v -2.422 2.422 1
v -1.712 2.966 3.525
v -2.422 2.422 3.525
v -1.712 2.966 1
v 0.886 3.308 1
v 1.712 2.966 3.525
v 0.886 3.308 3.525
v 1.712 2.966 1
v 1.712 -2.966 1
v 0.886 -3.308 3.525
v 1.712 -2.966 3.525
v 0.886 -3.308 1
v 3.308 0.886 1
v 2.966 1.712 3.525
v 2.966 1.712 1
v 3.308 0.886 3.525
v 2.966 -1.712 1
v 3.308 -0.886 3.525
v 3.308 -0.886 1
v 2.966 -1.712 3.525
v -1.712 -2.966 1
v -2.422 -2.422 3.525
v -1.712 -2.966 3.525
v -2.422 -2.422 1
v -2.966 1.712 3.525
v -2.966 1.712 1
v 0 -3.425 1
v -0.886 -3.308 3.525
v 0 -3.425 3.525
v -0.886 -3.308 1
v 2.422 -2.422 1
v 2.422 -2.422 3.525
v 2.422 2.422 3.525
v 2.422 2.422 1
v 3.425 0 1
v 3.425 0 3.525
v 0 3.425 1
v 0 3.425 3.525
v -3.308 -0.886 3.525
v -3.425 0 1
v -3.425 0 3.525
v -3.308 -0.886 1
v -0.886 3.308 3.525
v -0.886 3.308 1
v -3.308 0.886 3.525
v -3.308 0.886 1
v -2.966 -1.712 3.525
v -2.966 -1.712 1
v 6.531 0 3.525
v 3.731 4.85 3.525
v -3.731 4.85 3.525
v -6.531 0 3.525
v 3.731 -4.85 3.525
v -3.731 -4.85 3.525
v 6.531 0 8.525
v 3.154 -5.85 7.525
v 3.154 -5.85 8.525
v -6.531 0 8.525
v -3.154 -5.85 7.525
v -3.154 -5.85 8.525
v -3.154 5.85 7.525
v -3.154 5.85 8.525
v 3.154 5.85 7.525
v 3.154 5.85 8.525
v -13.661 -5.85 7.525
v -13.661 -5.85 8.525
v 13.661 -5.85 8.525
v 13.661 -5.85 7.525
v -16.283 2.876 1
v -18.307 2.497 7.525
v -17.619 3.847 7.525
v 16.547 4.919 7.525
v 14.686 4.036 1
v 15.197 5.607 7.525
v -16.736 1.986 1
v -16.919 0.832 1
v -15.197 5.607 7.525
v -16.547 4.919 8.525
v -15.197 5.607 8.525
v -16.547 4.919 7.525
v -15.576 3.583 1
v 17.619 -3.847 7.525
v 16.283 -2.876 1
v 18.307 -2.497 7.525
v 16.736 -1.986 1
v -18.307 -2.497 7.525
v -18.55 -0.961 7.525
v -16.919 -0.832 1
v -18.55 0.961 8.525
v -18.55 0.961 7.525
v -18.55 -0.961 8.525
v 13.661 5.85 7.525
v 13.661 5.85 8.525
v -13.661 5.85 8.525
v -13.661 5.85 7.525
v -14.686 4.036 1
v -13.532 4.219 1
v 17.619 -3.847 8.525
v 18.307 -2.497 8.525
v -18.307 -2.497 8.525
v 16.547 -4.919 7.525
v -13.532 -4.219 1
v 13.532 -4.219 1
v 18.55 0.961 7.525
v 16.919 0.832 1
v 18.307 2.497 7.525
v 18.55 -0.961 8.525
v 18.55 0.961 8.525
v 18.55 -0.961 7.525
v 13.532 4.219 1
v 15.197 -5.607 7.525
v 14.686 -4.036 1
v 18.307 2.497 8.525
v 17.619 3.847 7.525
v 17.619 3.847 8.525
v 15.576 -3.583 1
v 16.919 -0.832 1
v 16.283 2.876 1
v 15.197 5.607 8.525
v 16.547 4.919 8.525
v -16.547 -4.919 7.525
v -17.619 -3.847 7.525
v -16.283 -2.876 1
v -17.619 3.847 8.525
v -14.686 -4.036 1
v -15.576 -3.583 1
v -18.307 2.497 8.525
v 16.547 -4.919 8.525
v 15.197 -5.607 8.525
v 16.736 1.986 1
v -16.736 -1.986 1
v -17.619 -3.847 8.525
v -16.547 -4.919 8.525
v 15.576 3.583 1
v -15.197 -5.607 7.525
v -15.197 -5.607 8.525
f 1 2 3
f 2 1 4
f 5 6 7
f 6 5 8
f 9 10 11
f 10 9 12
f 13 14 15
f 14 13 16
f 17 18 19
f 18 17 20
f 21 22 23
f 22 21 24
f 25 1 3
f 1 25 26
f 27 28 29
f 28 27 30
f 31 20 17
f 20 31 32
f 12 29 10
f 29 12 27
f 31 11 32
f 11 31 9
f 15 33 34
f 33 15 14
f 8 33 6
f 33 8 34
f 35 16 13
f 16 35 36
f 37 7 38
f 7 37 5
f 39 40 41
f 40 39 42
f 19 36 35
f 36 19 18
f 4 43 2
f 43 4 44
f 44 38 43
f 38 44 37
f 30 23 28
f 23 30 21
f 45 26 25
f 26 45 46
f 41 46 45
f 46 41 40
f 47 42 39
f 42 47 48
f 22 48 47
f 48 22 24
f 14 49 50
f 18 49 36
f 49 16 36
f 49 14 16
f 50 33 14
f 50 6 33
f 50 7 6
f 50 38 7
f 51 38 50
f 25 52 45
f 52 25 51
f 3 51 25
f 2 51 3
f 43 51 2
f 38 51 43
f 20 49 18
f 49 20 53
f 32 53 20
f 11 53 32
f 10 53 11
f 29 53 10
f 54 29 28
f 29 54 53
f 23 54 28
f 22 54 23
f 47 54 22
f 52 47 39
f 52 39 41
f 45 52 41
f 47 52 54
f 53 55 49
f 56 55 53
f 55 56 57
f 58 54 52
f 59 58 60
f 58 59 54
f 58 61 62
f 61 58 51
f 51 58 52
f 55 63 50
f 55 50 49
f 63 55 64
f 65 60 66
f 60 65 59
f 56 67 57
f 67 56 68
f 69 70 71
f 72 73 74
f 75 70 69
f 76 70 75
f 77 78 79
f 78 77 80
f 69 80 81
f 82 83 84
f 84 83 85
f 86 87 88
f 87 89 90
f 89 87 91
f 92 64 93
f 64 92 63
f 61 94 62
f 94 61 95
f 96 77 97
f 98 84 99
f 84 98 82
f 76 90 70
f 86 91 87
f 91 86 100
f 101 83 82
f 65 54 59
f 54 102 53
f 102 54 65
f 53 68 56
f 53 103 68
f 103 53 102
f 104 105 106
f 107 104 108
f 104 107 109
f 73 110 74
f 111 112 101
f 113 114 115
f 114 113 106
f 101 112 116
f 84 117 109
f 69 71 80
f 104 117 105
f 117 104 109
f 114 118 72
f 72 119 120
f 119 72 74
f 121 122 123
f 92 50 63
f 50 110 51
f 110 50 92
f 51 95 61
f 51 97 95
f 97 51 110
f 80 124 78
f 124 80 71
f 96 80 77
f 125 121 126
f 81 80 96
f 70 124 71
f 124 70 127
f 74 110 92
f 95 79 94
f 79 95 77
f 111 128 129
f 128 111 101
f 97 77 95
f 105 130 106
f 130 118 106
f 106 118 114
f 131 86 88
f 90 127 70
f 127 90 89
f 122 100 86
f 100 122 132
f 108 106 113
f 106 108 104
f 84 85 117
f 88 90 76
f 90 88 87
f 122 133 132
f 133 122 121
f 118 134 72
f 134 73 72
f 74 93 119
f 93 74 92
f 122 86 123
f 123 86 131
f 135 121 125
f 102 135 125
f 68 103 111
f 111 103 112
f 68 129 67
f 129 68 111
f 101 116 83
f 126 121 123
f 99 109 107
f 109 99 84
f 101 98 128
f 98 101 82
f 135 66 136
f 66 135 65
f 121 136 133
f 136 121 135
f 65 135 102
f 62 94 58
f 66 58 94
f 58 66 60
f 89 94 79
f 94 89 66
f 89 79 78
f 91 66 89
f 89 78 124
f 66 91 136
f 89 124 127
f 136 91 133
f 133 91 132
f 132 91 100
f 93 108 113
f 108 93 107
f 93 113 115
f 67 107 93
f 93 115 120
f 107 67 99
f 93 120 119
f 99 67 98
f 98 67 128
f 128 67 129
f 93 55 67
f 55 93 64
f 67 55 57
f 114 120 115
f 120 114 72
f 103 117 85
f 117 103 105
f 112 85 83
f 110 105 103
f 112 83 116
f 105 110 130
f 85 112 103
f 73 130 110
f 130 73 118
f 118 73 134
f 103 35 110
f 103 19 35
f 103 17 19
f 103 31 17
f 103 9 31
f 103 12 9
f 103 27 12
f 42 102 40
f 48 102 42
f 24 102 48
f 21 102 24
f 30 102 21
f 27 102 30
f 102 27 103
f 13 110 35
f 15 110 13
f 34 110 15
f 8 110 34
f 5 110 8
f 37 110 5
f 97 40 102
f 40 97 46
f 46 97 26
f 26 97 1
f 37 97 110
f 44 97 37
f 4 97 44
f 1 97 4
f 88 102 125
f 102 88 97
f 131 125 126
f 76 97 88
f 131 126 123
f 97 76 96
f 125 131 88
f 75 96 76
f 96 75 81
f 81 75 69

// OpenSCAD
// file: ../lib/TOGMod1Constructors.scad
// TOGMod1Constructors-v1.11
// 
// Functions to construct objects understood by TOGMod1
// 
// v1.1:
// - Add togmod1_make_rounded_rect
// v1.2:
// - togmod1_make_rounded_rect can make ovals
// v1.3:
// - togmod1_circle_points, to just get the points of a circle
// - if pos parameter to circle function has a third element,
//   returned vertexes will include it as the z component;
// v1.3.1
// - Some assertions
// v1.4:
// - Refactor togmod1_rounded_rect_points and togmod1_circle_points
//   to use togmod1__make_nd_vector_adder for adapting to whatever
//   `pos` parameter is.
// v1.5:
// - togmod_rounded_rect_points will not simplify completely rounded sides
//   (where length of side is exactly twice the rounding radius)
//   unless simplify_rounded_sides=true
//   - This makes it more useful for polyhedron generation,
//     where radius varies, but number of points must remain constant.
// v1.6:
// - togmod1_make_rect makes a simple rectangle
// - togmod1_make_rounded_rect will defer to togmod1_make_rect when r=0
// v1.7:
// - togmod1_make_circle will return empty shape (["union"]) when d=0
// v1.8:
// - Add togmod1_text
// v1.9:
// - togmod1_circle_points uses 3 as minimum circle point count instead of 6
// v1.10:
// - Fix togmod1_linear_extrude_y so that range corresponds to Y start/end and
//   polygon X,Y correspond to X,Z.  Previously it was rotated wrongly,
//   which would have gone unnoticed for symmetrical shapes centered at 0,0.
// v1.11:
// - Remove an 'echo'

use <./TOGArrayLib1.scad>

function togmod1__make_nd_vector_adder(origin=[0,0]) =
	let(origin_is_zero = tal1_reduce(true, origin, function(prev,item) prev && item == 0))
	origin_is_zero ? (function(vec) len(vec) >= len(origin) ? vec : tal1_replace_at(origin, 0, vec)) :
	function(vec) [
		for(i=[0:1:max(len(origin),len(vec))-1]) (len(vec) > i ? vec[i] : 0) + (len(origin) > i ? origin[i] : 0),
	];

assert([1,2,3] == togmod1__make_nd_vector_adder()([1,2,3]));
assert([1,2,3] == togmod1__make_nd_vector_adder([0,0,3])([1,2]));


function togmod1_make_cuboid(size) =
	assert(is_list(size))
	assert(len(size) >= 3)
	assert(is_num(size[0]))
	assert(is_num(size[1]))
	assert(is_num(size[2]))
	["polyhedron-vf", [
		[-size[0]/2, -size[1]/2, -size[2]/2],
		[+size[0]/2, -size[1]/2, -size[2]/2],
		[-size[0]/2, +size[1]/2, -size[2]/2],
		[+size[0]/2, +size[1]/2, -size[2]/2],
		[-size[0]/2, -size[1]/2, +size[2]/2],
		[+size[0]/2, -size[1]/2, +size[2]/2],
		[-size[0]/2, +size[1]/2, +size[2]/2],
		[+size[0]/2, +size[1]/2, +size[2]/2]
	], [
		[0,1,3,2],[0,4,5,1],[4,6,7,5],[3,7,6,2],[1,5,7,3],[6,4,0,2]
	]];

function togmod1_make_polygon(verts) =
	["polygon-vp", verts, [[for( i=[0:1:len(verts)-1] ) i%len(verts)]]];

function togmod1_rounded_rect_points(size, r, pos=[0,0], simplify_rounded_sides=false) =
	assert(is_list(size))
	assert(len(size) >= 2)
	let(radii = is_list(r) ? r : is_num(r) ? [r,r] : assert(false, "rounded_rect r(adius) should be list<num> or num"))
	let(rx = radii[0])
	let(ry = radii[1])
	assert(is_num(rx))
	assert(is_num(ry))
	assert(size[0] >= 2*rx, str("size[0] must be >= 2*r[0]; size[0] = ",size[0],", 2*r[0] = ",2*rx))
	assert(size[1] >= 2*ry, str("size[1] must be >= 2*r[1]; size[1] = ",size[1],", 2*r[1] = ",2*ry))
	let(quarterfn=max($fn/4, 1))
	let(qfnx = simplify_rounded_sides && size[0] == 2*rx ? quarterfn-1 : quarterfn)
	let(qfny = simplify_rounded_sides && size[1] == 2*ry ? quarterfn-1 : quarterfn)
	let(finalizepos = togmod1__make_nd_vector_adder(pos))
[
	for(a=[0 : 1 : qfnx]) let(ang=      a*90/quarterfn) finalizepos([ size[0]/2-rx + rx*cos(ang),  size[1]/2-ry + ry*sin(ang)]),
	for(a=[0 : 1 : qfny]) let(ang= 90 + a*90/quarterfn) finalizepos([-size[0]/2+rx + rx*cos(ang),  size[1]/2-ry + ry*sin(ang)]),
	for(a=[0 : 1 : qfnx]) let(ang=180 + a*90/quarterfn) finalizepos([-size[0]/2+rx + rx*cos(ang), -size[1]/2+ry + ry*sin(ang)]),
	for(a=[0 : 1 : qfny]) let(ang=270 + a*90/quarterfn) finalizepos([ size[0]/2-rx + rx*cos(ang), -size[1]/2+ry + ry*sin(ang)]),
];

function togmod1_make_rect(size) =
	togmod1_make_polygon([
		[-size[0]/2, -size[1]/2],
		[+size[0]/2, -size[1]/2],
		[+size[0]/2, +size[1]/2],
		[-size[0]/2, +size[1]/2],
	]);

function togmod1_make_rounded_rect(size, r) =
	r == 0 ? togmod1_make_rect(size) :
	togmod1_make_polygon(togmod1_rounded_rect_points(size,r,simplify_rounded_sides=true));

/**
 * Returns points for an approximation of a circle where points are at distance r from pos.
 * Can be used to make other regular polygons, but the faces will be less than that
 * distance from pos (do some trig if you want face distance, e.g. for a hex nut).
 */
function togmod1_circle_points(r, pos=[0,0], d=undef) =
	assert( !is_undef(r) || !is_undef(d) )
	assert(!is_undef(pos[0]))
	assert(!is_undef(pos[1]))
	let(finalizepos = togmod1__make_nd_vector_adder(pos))
	let(r_ = !is_undef(r) ? r : d/2)
	let(fn = max($fn, 3))
	[for(i=[0 : 1 : fn-1]) finalizepos([r_*cos(i*360/fn), r_*sin(i*360/fn)])];

function togmod1_make_circle(r, pos=[0,0], d=undef) =
	r == 0 || d == 0 ? ["union"] :
	togmod1_make_polygon(togmod1_circle_points(r=r, pos=pos, d=d));

function togmod1_make_cylinder(d, zrange=[0,1], r=undef, pos=[0,0]) =
	assert( !is_undef(r) || !is_undef(d) )
	let( r_ = !is_undef(r) ? r : d/2 )
	// TODO: Make polyhedron directly
	["linear-extrude-zs", zrange, togmod1_make_circle(r=r_, pos=pos)];

function togmod1__is_range1d(range) = is_list(range) && len(range) == 2 && is_num(range[0]) && is_num(range[1]);

function togmod1_linear_extrude_z(range, shape) =
	assert(togmod1__is_range1d(range))
	["linear-extrude-zs", range, shape];
function togmod1_linear_extrude_x(range, shape) =
	assert(togmod1__is_range1d(range))
	["rotate", [90, 0, 90], togmod1_linear_extrude_z(range, shape)];
function togmod1_linear_extrude_y(range, shape) =
	assert(togmod1__is_range1d(range))
	["rotate", [90, 0,  0], togmod1_linear_extrude_z([-range[1], -range[0]], shape)];

function togmod1_text(text, size, font, halign, valign, spacing, direction, language, script) =
	["text-tsfhvsdls", text, size, font, halign, valign, spacing, direction, language, script];
// file: ../lib/TOGArrayLib1.scad
// TOGArrayLib1.5
// 
// Functions for working with arrays.
// 
// v1.1:
// - tal1_reduce assert(is_list(items)) to prevent infinite recursion
//   when given undefined or other non-list values
// v1.1.1:
// - Fix tal1_uniq_remap_v2 to return "list-remap-result" as the
//   first element of the returned list
// v1.2:
// - Add tal1_replace_at function
// v1.3:
// - tal1_is_vec_of, tal1_is_vec_of_num
// v1.4:
// - tal1_assert_for_each, for when you want to assert something
//   about each of a list of items and get nice failure messages
// v1.5:
// - Add tal1_duplicate_reversed function, which may be
//   handy when generating symmetrical polygons and stuff.

/**
 * Make a list with the contents of list `a`,
 * but starting at offset `off`, replaced by the contents of list `b`.
 * len(result) = max(len(a), off+len(b))
 */
function tal1_replace_at(a, off, b, default_value=undef, default_value_function=undef) =
	assert(is_list(a))
	assert(is_list(b))
	let( _dvf = !is_undef(default_value_function) ? default_value_function : function(i) default_value )
[
	for( i=[0:1:min(off,len(a))-1] ) a[i],
	for( i=[len(a):1:off-1] ) _dvf(i),
	for( i=[off:1:off+len(b)-1] ) b[i-off],
	for( i=[off+len(b):1:len(a)-1] ) a[i],
];

// Simplest case
assert([] == tal1_replace_at([], 0, []));
// Second simplest cases
assert(["foo"] == tal1_replace_at(["foo"], 0, []));
assert(["foo"] == tal1_replace_at([], 0, ["foo"]));
// Replace one item
assert(["foo","quux","baz"] == tal1_replace_at(["foo","bar","baz"], 1, ["quux"]));
// Replace and extend
assert(["foo","quux","tuna","tina"] == tal1_replace_at(["foo","bar","baz"], 1, ["quux", "tuna", "tina"]));
// Add beyond end of `a`
assert(["foo","zzz","quux"] == tal1_replace_at(["foo"], 2, ["quux"], default_value="zzz"));
// Adding 'nothing' should still fill to that point with defaults
assert(["foo","zzz","zzz"] == tal1_replace_at(["foo"], 3, [], default_value="zzz"));


function tal1_reduce(start, items, func, offset=0) =
	assert(is_list(items))
	len(items) == offset ? start :
	tal1_reduce(func(start, items[offset]), items, func, offset+1);

function tal1_consecutive_duplicate_count(items) = tal1_reduce(
	[0, undef],
	items,
	function(z,item) [z[0] + (item == z[1] ? 1 : 0), item]
)[0];

assert(0 == tal1_consecutive_duplicate_count([]));
assert(0 == tal1_consecutive_duplicate_count([50]));
assert(1 == tal1_consecutive_duplicate_count([50,50]));
assert(0 == tal1_consecutive_duplicate_count([50,51,52,53]));
assert(1 == tal1_consecutive_duplicate_count([50,51,52,52]));
assert(3 == tal1_consecutive_duplicate_count([50,50,50,50]));

// Set test_size to arbirarily large values
// to ensure that OpenSCAD can handle heavy recursion
let(test_size=1000) assert(test_size/2 == tal1_consecutive_duplicate_count([for(i=[0:1:test_size-1]) floor(i/2)]));



function tal1_uniq_(items, off0, off1) =
	let(chunklen = off1-off0)
	chunklen == 0 ? [] :
	chunklen == 1 ? [items[off0]] :
	let(half=floor(chunklen/2))
	let(left  = tal1_uniq_(items, off0     , off0+half))
	let(right = tal1_uniq_(items, off0+half, off1     ))
	assert(len(left) > 0)
	assert(len(right) > 0)
	left[len(left)-1] == right[0] ? [each left, for(i=[1:1:len(right)-1]) right[i]] :
	[each left, each right];

/** Given a list of items, returns a new list with identical consecutive items merged */
function tal1_uniq(items) = tal1_uniq_(items, 0, len(items));

assert([] == tal1_uniq([]));
assert([123] == tal1_uniq([123]));
assert([55,0,1,2,3] == tal1_uniq([55,0,1,2,3]));
assert([55,0,1,2] == tal1_uniq([55,0,1,1,2]));
assert([55,0,1] == tal1_uniq([55,55,0,0,0,0,0,0,1,1,1,1]));
assert([55,0] == tal1_uniq([55,0,0,0,0,0,0,0]));



/**
 * Returns [new items, old index -> new index mapping].
 * No-op version.
 */
function tal1_uniq_remap_v1(items) =
	["list-remap-result", items, [for (vi=[0:1:len(items)-1]) vi]];

// [a, a, b, b, c, c]
//
// [a,    ...], []  -> [a],[0]
// [a, a, ...], [0] -> [a],[0,0]

assert([1,2,3] == [1,2,3]);

/**
 * Recursive version that will combine adjacent identical vertexes,
 * but will use the original items.
 */
function tal1_uniq_remap_v2(items, map=[]) =
	let(index = len(map))
	len(items) == index ? ["list-remap-result", items, map] :
	index == 0 ? tal1_uniq_remap_v2(items, [0]) :
	items[index] == items[map[index-1]] ? tal1_uniq_remap_v2(items, [for(vi=map) vi, map[index-1]]) :
	tal1_uniq_remap_v2(items, [for(vi=map) vi, index]);

assert(tal1_uniq_remap_v2([1,1,2,2,3,4]) == ["list-remap-result", [1,1,2,2,3,4], [0,0,2,2,4,5]]);


/**
 * Returns true if `vec` is a list of at least min_len items
 * and component_check(each item, even those beyond min_len) is true.
 */
function tal1_is_vec_of(vec, min_len=0, component_check=function(x) true) =
	assert(is_num(min_len) && min_len >= 0)
	assert(is_function(component_check))
	is_list(vec) && len(vec) >= min_len &&
	tal1_reduce(true, vec, function(prev,item) prev && component_check(item));

function tal1_is_vec_of_num(vec, min_len=0) = tal1_is_vec_of(vec, min_len, function(i) is_num(i));

assert( true == tal1_is_vec_of_num([1,2,3]));
assert( true == tal1_is_vec_of_num([]));
assert( true == tal1_is_vec_of_num([1,2,3], 3));
assert(false == tal1_is_vec_of_num([1,2], 3));
assert(false == tal1_is_vec_of_num([1,2,"spoon"], 3));
// Requirements are ambiguous when
// first min_len items are numbers, but there are non-numeric items afterwards,
// so let's error on the side of saying 'no, it's not a list of numbers';
// i.e. the item check and the min_len are independent.
assert(false == tal1_is_vec_of_num([1,2,3,"artichoke"], 3));


/**
 * Asserts that item_checker(each item in list, index of item)[0] is true.
 * Second element of item_checker return value is assertion message.
 * Returns the original list, in case that's useful to you.
 */
function tal1_assert_for_each(list, item_checker) =
	let( _ignored = [ for(i=[0:1:len(list)-1])
		let(q=item_checker(list[i],i))
		let(passed=is_bool(q) ? q : is_list(q) ? q[0] : assert(false, str(
			"tal1_assert_for_each: item_checker should return Bool|[Bool,String], but returned ",
			q, " for item at index ", i)))
		let(message=is_list(q) ? q[1] : undef)
		assert(passed, message)
		q
	])
	list;

// Callback can return a boolean...
assert([1,2,3] == tal1_assert_for_each([1,2,3], function(v,i) is_num(v)));
// ...or a [boolean, string]
assert([1,2,3] == tal1_assert_for_each([1,2,3], function(v,i) [is_num(v), "element be a num"]));

// [a, b, c] -> [a, b, c, rxf(c), rxf(b), rxf(a)]
function tal1_duplicate_reversed(list, rxf=function(item) item) =
	[
		each list,
		for( i=[len(list)-1 : -1 : 0] ) rxf(list[i]),
	];
// file: ../lib/TOGComplexLib1.scad
function tcplx1_multiply(a, b) =
	[a[0]*b[0] - a[1]*b[1], a[0]*b[1] + a[1]*b[0]];
function tcplx1_divide(a, b) =
	let(bot = (b[0]*b[0] + b[1]*b[1]))
	[
		(a[0]*b[0] + a[1]*b[1])/bot,
		(a[1]*b[0] - a[0]*b[1])/bot
	];

assert([-11,23] == tcplx1_multiply([3,2], [1,7]));

assert([-1,3] == tcplx1_multiply([3,1], [0,1]));
assert([-1,3] == tcplx1_multiply([0,1], [3,1]));

echo(tcplx1_divide([-1,3], [3,1]));
assert([0,1] == tcplx1_divide([-1,3], [3,1]));

function tcplx1_normalize(vec) =
	let(veclen = sqrt(vec[0]*vec[0]+vec[1]*vec[1]))
	[vec[0] / veclen, vec[1] / veclen];

function tcplx1_relative_turnvec_vv(v0, v1) =
	tcplx1_divide(tcplx1_normalize(v1), tcplx1_normalize(v0));

function tcplx1_relative_turnvec_abc(p0, p1, p2) = tcplx1_relative_turnvec_vv(p1-p0, p2-p1);

// A 90-degree turn
assert([0,1] == tcplx1_relative_turnvec_abc([0,0], [1,0], [1,1]));
assert([0,1] == tcplx1_relative_turnvec_abc([0,0], [0,1], [-1,1]));

// A 45-degree turn
assert(tcplx1_normalize([1,1]) == tcplx1_relative_turnvec_abc([0,0], [1,0], [ 2,1]));
assert(tcplx1_normalize([1,1]) == tcplx1_relative_turnvec_abc([0,0], [0,1], [-1,2]));


function tcplx1_relative_angle_abc(p0, p1, p2) =
	let(turnvec = tcplx1_relative_turnvec_abc(p0, p1, p2))
	atan2(turnvec[1], turnvec[0]);

assert(-135 == tcplx1_relative_angle_abc([0,0], [1,0], [0,-1]));
assert( -90 == tcplx1_relative_angle_abc([0,0], [1,0], [1,-1]));
assert(   0 == tcplx1_relative_angle_abc([0,0], [1,0], [2, 0]));
assert(  90 == tcplx1_relative_angle_abc([0,0], [1,0], [1, 1]));
assert( 135 == tcplx1_relative_angle_abc([0,0], [1,0], [0, 1]));

assert(  90 == tcplx1_relative_angle_abc([1,1], [3,3], [1, 5]));
// file: ../lib/TOGMod1.scad
// TOGMod1.9
// OpenSCAD library for representing shapes
// 
// See also: Functional OpenSCAD (https://github.com/thehans/FunctionalOpenSCAD)
// 
// v1.8:
// - Add `text-tsfhvsdls`
// v1.9
// - Add `offset-ds` (offset with _d_elta a _s_hape)

module togmod1_domodule(mod) {
	assert(is_list(mod));
	assert(len(mod) > 0);
	if( mod[0] == "polygon-vp" ) {
		// ["polygon-vp", vertexes, paths]
		polygon(points=mod[1], paths=mod[2]);
	} else if( mod[0] == "polyhedron-vf" ) {
		polyhedron(mod[1], faces=mod[2]);
	} else if( mod[0] == "scale" ) {
		assert(len(mod) == 3);
		scale(mod[1]) togmod1_domodule(mod[2]);
	} else if( mod[0] == "translate" ) {
		assert(len(mod) == 3);
		assert(is_list(mod[1]));
		for(c=mod[1]) assert(is_num(c), "translate component should be numeric");
		translate(mod[1]) togmod1_domodule(mod[2]);
	} else if( mod[0] == "rotate" ) {
		assert(len(mod) == 3);
		rotate(mod[1]) togmod1_domodule(mod[2]);
	} else if( mod[0] == "intersection" ) {
		intersection_for( i=[1:1:len(mod)-1] ) togmod1_domodule(mod[i]);
	} else if( mod[0] == "difference" ) {
		difference() {
			togmod1_domodule(mod[1]);
			for( i=[2:1:len(mod)-1] ) togmod1_domodule(mod[i]);
		}
	} else if( mod[0] == "union" ) {
		for( i=[1:1:len(mod)-1] ) togmod1_domodule(mod[i]);
	} else if( mod[0] == "hull" ) {
		hull() for( i=[1:1:len(mod)-1] ) togmod1_domodule(mod[i]);
	} else if( mod[0] == "offset-rs" ) {
		assert(len(mod) == 3);
		assert(is_num(mod[1]));
		assert(is_list(mod[2]));
		offset(mod[1]) togmod1_domodule(mod[2]);
	} else if( mod[0] == "linear-extrude-zs" ) {
		// ["linear-extrude-zs", [z0,z1], 2d_shape] // centered
		// ["linear-extrude-zs", height, 2d_shape]
		let( zrange = is_list(mod[1]) ? mod[1] : [-mod[1]/2, mod[1]/2] ) {
			translate([0,0,zrange[0]]) linear_extrude(zrange[1]-zrange[0]) togmod1_domodule(mod[2]);
		}
	} else if( mod[0] == "render" ) {
		render() togmod1_domodule(mod[1]);
	} else if( mod[0] == "minkowski" ) {
		minkowski() {
			togmod1_domodule(mod[1]);
			togmod1_domodule(mod[2]);
		}
	} else if( mod[0] == "x-debug" ) {
		# togmod1_domodule(mod[1]);
	} else if( mod[0] == "x-color" ) {
		color(mod[1]) togmod1_domodule(mod[2]);
	} else if( mod[0] == "text-tsfhvsdls" ) {
		text(text=mod[1], size=mod[2], font=mod[3], halign=mod[4], valign=mod[5], spacing=mod[6], direction=mod[7], language=mod[7], script=mod[8]);
	} else if( mod[0] == "offset-ds" ) {
		assert(is_num(mod[1]));
		assert(is_list(mod[2]));
		offset(delta=mod[1]) togmod1_domodule(mod[2]);
	} else {
		assert(false, str("Unrecognized shape: ", mod[0]));
	}
}
// main file
/// MatchfitHexHeadNut-v1.0

bottom_margin = 1;
top_margin = 1;

inch = 25.4;
hole_diameter = 1/4*inch + 0.5;
hex_head_diameter = 7/16*inch + 0.2;

use <../lib/TOGMod1.scad>
use <../lib/TOGPath1.scad>
use <../lib/TOGPolyhedronLib1.scad>

$fn = 24;

z0 = bottom_margin;
z2 = 3/8*inch - top_margin;
z1 = z2 - 1;

function nut_hull() = tphl1_make_polyhedron_from_layer_function([
	[z0, -3/32*inch + (z0*0.25)],
	[z1, 0 - (3/8*inch - z1)*0.25],
	[z2, 0 - (3/8*inch - z1)*0.25],
],
	function(params)
	let(z=params[0])
	let(offset=params[1])
	[ for( p = togpath1_rath_to_points(["togpath1-rath",
		["togpath1-rathnode", [-3/4*inch, -1/4*inch], ["round", 1/4*inch-1], ["offset", offset]],
		["togpath1-rathnode", [ 3/4*inch, -1/4*inch], ["round", 1/4*inch-1], ["offset", offset]],
		["togpath1-rathnode", [ 3/4*inch,  1/4*inch], ["round", 1/4*inch-1], ["offset", offset]],
		["togpath1-rathnode", [-3/4*inch,  1/4*inch], ["round", 1/4*inch-1], ["offset", offset]],
	])) [p[0], p[1], z] ]
);

function head_hole() = ["union",
	tphl1_make_z_cylinder(d=hole_diameter, zrange=[-1, 3/8*inch+1]),
	tphl1_extrude_polypoints([z2-5, z2+1], [
		[-hex_head_diameter/cos(30)/2, 0],
		[                           0, -hex_head_diameter/cos(60)/2],
		[+hex_head_diameter/cos(30)/2, 0],
		[                           0, +hex_head_diameter/cos(60)/2],
	]),
	// tphl1_make_z_cylinder(d=hex_head_diameter/cos(30), zrange=[3/8*inch-5, 3/8*inch+1], $fn=6), // (cos (* pi 2 (/ 30 360.0)))
];

togmod1_domodule(["difference",
	nut_hull(),
	head_hole()
]);
